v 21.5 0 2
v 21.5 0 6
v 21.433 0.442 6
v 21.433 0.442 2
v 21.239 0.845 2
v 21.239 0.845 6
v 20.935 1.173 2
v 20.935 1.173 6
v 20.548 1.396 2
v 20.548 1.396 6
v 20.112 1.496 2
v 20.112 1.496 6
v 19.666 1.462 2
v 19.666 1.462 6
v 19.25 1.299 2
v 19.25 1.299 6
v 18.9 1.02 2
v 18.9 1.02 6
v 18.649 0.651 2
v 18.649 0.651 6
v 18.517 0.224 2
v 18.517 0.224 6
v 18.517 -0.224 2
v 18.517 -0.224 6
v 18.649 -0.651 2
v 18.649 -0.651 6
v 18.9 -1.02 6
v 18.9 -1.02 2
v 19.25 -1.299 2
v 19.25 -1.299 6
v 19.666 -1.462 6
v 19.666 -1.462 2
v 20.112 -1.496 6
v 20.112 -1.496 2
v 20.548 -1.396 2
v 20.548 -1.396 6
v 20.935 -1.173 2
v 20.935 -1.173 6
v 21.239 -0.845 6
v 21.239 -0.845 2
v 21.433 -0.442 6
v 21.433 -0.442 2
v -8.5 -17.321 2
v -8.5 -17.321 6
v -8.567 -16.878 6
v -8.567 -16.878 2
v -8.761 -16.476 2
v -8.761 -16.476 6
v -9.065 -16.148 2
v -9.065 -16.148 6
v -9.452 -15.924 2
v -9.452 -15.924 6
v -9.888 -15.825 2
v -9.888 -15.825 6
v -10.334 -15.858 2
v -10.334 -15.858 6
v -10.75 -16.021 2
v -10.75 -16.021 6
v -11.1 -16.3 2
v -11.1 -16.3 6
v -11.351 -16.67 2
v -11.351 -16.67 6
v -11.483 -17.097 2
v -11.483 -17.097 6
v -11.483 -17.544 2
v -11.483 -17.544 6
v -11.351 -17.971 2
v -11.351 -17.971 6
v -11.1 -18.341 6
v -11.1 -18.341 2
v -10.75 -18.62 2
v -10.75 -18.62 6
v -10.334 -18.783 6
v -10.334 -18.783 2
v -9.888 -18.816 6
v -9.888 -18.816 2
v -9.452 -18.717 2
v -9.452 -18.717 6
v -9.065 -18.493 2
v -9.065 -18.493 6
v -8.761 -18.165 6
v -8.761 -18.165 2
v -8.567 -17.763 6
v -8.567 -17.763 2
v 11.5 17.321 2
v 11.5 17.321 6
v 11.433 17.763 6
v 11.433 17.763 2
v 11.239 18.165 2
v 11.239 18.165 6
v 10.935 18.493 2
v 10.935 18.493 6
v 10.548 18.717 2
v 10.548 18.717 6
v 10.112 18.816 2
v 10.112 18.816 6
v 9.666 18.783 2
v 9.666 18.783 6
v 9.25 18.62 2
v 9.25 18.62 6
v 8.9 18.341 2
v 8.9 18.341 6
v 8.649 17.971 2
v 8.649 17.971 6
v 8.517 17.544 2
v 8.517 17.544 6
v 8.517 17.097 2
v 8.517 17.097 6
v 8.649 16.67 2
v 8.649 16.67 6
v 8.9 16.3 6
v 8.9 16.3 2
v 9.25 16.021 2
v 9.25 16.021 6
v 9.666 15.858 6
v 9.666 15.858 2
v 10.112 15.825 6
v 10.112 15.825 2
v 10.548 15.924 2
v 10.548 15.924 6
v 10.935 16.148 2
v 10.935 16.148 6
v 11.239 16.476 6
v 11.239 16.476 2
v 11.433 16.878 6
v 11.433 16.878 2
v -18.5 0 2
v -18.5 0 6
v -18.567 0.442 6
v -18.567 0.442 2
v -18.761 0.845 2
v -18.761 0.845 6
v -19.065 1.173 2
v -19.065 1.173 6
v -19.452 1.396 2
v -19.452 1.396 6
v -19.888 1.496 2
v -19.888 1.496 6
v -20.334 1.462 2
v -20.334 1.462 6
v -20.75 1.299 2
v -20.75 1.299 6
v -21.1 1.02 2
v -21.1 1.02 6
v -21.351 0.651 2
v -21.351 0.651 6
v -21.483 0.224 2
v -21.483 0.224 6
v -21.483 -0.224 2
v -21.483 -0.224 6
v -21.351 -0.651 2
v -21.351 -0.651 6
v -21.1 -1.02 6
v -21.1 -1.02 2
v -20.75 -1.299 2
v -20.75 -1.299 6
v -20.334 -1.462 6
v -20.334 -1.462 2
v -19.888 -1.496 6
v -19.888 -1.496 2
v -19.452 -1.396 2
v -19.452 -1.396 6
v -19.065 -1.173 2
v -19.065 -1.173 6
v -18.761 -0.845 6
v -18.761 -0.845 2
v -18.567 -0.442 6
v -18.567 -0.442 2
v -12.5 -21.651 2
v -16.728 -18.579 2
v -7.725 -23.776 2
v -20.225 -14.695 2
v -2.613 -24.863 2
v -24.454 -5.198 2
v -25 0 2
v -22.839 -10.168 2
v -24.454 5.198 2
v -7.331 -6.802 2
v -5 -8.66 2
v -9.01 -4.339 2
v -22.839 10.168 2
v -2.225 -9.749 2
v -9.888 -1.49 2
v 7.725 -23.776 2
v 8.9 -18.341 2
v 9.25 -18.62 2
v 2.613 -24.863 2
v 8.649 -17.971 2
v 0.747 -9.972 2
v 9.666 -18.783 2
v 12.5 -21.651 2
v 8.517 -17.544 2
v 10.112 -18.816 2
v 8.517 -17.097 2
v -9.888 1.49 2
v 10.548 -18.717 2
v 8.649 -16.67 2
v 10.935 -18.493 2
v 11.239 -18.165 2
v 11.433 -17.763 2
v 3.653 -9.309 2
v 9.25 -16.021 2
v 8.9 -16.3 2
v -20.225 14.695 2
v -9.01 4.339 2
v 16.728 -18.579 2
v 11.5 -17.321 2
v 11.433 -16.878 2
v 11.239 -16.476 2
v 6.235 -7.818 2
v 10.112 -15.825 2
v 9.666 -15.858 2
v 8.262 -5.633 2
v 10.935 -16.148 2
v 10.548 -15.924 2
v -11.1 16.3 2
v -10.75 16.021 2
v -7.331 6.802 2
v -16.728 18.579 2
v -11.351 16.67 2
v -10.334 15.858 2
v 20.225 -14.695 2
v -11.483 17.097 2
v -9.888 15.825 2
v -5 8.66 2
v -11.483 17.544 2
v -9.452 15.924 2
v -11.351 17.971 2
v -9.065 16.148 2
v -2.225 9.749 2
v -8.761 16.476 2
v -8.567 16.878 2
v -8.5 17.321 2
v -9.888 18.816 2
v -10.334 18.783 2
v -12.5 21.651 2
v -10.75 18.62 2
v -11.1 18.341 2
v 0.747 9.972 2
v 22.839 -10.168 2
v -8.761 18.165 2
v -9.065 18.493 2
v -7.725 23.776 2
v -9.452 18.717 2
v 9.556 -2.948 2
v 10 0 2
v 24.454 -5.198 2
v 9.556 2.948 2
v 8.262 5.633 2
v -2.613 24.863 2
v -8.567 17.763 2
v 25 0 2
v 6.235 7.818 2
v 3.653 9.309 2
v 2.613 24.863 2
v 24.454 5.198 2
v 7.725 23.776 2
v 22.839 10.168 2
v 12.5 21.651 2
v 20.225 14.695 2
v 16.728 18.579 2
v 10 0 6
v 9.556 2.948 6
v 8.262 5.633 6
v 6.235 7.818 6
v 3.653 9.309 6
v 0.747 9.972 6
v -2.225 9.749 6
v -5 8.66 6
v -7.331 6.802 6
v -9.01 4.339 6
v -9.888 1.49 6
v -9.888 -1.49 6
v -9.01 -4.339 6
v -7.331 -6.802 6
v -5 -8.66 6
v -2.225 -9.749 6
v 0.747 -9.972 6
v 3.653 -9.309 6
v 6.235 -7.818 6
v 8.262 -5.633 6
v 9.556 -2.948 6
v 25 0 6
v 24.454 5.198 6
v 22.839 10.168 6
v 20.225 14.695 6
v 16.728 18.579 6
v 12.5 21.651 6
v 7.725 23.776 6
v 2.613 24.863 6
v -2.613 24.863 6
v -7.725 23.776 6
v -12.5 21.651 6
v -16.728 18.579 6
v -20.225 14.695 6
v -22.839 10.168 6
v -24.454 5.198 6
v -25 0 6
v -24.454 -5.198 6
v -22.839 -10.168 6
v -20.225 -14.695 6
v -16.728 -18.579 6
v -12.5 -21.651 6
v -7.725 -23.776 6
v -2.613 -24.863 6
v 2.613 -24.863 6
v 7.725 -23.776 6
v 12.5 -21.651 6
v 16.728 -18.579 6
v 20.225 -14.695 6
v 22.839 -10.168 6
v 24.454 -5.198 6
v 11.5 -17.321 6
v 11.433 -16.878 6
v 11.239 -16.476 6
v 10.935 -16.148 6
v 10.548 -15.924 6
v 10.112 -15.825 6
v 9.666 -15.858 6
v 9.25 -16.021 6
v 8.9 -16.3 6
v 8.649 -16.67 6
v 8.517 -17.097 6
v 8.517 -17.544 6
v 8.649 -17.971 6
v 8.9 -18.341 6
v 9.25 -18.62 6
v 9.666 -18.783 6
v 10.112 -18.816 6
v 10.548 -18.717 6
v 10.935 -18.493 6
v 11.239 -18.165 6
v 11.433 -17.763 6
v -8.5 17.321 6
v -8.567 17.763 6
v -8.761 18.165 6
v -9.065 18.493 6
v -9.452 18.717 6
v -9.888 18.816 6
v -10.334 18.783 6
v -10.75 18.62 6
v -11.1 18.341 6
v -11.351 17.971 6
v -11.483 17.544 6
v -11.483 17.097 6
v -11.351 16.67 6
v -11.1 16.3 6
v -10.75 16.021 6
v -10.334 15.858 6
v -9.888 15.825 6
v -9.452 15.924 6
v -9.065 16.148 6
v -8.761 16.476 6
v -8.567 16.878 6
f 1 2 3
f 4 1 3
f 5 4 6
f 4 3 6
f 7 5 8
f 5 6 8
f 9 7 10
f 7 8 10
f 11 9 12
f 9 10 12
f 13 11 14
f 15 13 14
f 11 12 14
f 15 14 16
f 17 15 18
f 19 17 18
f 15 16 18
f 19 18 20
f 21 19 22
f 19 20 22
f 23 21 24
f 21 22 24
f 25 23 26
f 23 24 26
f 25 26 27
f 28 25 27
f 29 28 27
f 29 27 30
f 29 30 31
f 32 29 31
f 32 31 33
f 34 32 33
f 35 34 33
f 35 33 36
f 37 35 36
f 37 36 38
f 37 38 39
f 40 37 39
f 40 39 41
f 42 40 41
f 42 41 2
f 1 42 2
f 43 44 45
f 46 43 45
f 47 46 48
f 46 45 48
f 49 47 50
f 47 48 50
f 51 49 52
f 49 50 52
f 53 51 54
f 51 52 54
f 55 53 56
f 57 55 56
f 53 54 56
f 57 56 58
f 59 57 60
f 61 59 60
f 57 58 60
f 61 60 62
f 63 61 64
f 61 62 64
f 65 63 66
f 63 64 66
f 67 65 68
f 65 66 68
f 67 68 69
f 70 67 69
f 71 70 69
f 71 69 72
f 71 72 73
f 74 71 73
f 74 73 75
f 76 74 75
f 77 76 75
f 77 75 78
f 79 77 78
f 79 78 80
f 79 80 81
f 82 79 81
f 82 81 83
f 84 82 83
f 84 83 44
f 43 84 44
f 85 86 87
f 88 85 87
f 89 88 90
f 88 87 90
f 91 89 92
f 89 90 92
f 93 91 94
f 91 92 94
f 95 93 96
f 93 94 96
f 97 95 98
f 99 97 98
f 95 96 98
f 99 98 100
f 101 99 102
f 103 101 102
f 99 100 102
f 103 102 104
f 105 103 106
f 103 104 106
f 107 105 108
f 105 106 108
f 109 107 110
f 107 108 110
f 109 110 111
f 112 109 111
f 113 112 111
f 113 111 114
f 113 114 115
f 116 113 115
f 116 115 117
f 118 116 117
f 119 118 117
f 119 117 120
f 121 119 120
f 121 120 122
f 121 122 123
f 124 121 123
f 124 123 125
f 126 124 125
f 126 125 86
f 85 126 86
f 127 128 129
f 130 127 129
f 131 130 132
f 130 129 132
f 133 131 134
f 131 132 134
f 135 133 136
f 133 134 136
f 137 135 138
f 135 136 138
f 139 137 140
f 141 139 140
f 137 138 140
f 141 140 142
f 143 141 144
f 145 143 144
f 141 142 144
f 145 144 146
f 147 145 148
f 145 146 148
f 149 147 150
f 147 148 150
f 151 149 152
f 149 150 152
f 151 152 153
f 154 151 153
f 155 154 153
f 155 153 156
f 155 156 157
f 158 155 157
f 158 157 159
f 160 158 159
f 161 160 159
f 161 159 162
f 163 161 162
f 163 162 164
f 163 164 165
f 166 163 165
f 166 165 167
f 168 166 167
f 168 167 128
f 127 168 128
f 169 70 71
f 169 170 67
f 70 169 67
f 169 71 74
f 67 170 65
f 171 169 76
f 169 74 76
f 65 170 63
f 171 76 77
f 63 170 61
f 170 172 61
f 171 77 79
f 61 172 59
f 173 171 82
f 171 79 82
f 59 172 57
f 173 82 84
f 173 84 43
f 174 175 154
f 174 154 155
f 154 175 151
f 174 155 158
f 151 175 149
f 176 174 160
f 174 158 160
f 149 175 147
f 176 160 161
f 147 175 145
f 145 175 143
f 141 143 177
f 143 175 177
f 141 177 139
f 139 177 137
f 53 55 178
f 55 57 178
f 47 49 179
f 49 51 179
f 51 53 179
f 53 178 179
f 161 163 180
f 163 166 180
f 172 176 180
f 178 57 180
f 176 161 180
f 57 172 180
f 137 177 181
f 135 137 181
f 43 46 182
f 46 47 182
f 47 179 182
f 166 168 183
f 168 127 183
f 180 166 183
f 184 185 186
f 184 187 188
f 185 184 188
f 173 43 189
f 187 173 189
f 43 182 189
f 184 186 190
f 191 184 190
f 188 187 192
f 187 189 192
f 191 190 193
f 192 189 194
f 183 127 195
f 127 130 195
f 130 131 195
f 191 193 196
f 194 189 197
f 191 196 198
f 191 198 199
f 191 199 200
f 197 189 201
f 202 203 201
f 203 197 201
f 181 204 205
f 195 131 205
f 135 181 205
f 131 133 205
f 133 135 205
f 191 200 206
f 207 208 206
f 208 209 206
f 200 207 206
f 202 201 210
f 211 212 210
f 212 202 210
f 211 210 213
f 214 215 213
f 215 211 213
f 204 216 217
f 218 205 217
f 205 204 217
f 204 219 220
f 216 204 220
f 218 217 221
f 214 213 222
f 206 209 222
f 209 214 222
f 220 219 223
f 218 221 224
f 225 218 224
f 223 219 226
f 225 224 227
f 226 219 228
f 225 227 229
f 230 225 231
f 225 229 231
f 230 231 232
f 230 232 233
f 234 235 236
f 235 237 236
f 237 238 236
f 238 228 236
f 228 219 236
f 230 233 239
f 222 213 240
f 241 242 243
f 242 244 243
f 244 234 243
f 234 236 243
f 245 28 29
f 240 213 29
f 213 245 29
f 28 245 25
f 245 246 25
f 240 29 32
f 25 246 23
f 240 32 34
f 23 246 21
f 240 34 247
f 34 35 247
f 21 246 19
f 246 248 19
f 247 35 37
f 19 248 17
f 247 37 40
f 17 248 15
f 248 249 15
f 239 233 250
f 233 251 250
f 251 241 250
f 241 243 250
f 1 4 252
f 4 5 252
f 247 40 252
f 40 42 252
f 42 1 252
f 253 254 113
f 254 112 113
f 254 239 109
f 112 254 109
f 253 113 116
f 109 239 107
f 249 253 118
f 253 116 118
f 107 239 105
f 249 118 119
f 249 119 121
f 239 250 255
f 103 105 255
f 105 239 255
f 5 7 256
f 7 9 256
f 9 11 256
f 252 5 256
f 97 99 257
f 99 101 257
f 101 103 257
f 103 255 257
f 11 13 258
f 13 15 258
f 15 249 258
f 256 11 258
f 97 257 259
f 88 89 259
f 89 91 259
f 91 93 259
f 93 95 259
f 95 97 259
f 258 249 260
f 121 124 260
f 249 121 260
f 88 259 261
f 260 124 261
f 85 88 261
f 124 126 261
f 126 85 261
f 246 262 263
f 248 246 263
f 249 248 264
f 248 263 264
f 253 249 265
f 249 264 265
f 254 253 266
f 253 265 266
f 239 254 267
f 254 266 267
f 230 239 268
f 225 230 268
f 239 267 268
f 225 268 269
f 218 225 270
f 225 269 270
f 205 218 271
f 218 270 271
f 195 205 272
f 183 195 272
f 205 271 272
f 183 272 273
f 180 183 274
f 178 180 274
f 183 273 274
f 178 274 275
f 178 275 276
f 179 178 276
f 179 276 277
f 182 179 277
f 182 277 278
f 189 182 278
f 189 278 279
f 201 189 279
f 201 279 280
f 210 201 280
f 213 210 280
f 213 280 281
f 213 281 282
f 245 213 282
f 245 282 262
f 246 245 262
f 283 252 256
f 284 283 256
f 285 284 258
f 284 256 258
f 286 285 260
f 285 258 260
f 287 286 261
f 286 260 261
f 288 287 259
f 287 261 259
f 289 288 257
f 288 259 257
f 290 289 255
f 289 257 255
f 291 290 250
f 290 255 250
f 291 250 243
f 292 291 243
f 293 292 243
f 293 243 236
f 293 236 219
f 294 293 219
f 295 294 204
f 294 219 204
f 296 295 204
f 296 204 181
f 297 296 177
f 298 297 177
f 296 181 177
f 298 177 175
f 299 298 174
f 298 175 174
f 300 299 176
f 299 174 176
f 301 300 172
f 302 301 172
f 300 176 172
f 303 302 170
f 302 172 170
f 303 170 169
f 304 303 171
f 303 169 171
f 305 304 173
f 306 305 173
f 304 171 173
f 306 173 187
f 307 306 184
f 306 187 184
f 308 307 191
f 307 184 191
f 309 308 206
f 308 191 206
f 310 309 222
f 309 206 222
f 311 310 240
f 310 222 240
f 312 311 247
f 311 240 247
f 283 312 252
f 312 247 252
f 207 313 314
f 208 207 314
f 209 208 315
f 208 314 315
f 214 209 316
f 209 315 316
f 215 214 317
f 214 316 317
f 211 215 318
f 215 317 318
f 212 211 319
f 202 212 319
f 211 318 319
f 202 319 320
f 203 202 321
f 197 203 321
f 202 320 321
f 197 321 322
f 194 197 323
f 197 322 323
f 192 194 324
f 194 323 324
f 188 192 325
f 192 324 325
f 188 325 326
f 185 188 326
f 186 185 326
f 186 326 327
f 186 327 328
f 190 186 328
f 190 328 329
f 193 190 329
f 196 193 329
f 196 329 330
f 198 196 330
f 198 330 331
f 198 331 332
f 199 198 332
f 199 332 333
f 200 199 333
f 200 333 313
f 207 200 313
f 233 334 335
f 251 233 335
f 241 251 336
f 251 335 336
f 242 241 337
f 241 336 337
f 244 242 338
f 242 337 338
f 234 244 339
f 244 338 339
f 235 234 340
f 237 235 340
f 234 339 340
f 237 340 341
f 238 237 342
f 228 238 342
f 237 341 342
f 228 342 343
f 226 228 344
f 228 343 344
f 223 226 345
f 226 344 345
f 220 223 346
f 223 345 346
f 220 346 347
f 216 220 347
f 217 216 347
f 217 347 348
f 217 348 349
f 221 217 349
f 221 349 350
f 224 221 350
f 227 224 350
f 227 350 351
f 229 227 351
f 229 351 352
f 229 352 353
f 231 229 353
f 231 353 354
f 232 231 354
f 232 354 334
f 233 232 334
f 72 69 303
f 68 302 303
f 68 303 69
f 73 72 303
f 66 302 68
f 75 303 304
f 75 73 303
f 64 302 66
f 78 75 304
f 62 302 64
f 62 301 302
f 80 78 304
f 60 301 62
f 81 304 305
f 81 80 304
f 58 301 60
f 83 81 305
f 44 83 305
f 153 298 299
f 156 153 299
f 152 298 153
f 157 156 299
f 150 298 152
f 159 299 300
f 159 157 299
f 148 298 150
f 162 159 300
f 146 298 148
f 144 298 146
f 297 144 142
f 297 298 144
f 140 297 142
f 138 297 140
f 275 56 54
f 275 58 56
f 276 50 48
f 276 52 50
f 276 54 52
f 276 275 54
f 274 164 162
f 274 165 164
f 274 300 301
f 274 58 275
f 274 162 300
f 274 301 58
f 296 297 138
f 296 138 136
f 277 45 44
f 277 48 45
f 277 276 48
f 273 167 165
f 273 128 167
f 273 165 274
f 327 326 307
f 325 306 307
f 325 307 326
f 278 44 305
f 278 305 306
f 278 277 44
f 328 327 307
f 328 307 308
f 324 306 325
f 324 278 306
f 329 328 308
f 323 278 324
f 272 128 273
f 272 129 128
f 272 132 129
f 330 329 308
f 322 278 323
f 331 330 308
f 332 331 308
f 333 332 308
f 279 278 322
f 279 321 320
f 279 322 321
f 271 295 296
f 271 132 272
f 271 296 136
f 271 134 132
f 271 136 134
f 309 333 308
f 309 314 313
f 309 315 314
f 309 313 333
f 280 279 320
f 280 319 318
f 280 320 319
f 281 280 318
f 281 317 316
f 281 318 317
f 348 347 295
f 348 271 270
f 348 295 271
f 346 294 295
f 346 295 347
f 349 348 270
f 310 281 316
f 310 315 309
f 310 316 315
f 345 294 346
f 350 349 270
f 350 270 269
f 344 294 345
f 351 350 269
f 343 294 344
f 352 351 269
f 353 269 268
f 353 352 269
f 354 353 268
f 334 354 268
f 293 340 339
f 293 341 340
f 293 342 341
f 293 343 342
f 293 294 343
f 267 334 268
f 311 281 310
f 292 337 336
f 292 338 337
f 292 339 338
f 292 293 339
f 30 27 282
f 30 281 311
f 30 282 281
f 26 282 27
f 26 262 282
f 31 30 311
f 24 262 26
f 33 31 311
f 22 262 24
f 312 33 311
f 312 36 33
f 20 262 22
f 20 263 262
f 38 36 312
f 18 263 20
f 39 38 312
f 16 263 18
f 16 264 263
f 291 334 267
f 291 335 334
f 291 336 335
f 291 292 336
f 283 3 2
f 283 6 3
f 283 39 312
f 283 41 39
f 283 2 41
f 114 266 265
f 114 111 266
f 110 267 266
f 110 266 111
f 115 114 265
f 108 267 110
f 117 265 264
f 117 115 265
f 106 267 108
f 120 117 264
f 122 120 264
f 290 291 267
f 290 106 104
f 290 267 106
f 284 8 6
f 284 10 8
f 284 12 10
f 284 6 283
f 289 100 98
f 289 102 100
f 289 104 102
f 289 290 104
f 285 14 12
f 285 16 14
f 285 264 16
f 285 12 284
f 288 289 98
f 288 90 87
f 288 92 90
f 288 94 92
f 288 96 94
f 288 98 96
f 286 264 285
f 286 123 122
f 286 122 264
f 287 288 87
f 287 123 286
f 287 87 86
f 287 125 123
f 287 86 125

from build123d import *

# Parameters (mm, degrees)
CYLINDER_R      = 25
CYLINDER_DEPTH  = 4
SKETCH_R        = 1.5
POCKET_DEPTH    = 4.001
SKETCH001_R     = 10
POCKET001_DEPTH = 5


with BuildPart() as part:
    # Cylinder → Cylinder (new body)
    with BuildSketch(Plane.XY.offset(2)):
        Circle(CYLINDER_R)
    extrude(amount=CYLINDER_DEPTH)

    # Sketch → Pocket (cut, through all)
    with BuildSketch(Plane.XY.offset(6)):
        with Locations((20, 0)):
            Circle(SKETCH_R)
        with Locations((-10, 17.320508)):
            Circle(SKETCH_R)
        with Locations((-10, -17.320508)):
            Circle(SKETCH_R)
        with Locations((-20, 0)):
            Circle(SKETCH_R)
        with Locations((10, -17.320508)):
            Circle(SKETCH_R)
        with Locations((10, 17.320508)):
            Circle(SKETCH_R)
    extrude(amount=-POCKET_DEPTH, mode=Mode.SUBTRACT)

    # Sketch001 → Pocket001 (cut)
    with BuildSketch(Plane.XY.offset(6)):
        Circle(SKETCH001_R)
    extrude(amount=-POCKET001_DEPTH, mode=Mode.SUBTRACT)


solid = part.part
